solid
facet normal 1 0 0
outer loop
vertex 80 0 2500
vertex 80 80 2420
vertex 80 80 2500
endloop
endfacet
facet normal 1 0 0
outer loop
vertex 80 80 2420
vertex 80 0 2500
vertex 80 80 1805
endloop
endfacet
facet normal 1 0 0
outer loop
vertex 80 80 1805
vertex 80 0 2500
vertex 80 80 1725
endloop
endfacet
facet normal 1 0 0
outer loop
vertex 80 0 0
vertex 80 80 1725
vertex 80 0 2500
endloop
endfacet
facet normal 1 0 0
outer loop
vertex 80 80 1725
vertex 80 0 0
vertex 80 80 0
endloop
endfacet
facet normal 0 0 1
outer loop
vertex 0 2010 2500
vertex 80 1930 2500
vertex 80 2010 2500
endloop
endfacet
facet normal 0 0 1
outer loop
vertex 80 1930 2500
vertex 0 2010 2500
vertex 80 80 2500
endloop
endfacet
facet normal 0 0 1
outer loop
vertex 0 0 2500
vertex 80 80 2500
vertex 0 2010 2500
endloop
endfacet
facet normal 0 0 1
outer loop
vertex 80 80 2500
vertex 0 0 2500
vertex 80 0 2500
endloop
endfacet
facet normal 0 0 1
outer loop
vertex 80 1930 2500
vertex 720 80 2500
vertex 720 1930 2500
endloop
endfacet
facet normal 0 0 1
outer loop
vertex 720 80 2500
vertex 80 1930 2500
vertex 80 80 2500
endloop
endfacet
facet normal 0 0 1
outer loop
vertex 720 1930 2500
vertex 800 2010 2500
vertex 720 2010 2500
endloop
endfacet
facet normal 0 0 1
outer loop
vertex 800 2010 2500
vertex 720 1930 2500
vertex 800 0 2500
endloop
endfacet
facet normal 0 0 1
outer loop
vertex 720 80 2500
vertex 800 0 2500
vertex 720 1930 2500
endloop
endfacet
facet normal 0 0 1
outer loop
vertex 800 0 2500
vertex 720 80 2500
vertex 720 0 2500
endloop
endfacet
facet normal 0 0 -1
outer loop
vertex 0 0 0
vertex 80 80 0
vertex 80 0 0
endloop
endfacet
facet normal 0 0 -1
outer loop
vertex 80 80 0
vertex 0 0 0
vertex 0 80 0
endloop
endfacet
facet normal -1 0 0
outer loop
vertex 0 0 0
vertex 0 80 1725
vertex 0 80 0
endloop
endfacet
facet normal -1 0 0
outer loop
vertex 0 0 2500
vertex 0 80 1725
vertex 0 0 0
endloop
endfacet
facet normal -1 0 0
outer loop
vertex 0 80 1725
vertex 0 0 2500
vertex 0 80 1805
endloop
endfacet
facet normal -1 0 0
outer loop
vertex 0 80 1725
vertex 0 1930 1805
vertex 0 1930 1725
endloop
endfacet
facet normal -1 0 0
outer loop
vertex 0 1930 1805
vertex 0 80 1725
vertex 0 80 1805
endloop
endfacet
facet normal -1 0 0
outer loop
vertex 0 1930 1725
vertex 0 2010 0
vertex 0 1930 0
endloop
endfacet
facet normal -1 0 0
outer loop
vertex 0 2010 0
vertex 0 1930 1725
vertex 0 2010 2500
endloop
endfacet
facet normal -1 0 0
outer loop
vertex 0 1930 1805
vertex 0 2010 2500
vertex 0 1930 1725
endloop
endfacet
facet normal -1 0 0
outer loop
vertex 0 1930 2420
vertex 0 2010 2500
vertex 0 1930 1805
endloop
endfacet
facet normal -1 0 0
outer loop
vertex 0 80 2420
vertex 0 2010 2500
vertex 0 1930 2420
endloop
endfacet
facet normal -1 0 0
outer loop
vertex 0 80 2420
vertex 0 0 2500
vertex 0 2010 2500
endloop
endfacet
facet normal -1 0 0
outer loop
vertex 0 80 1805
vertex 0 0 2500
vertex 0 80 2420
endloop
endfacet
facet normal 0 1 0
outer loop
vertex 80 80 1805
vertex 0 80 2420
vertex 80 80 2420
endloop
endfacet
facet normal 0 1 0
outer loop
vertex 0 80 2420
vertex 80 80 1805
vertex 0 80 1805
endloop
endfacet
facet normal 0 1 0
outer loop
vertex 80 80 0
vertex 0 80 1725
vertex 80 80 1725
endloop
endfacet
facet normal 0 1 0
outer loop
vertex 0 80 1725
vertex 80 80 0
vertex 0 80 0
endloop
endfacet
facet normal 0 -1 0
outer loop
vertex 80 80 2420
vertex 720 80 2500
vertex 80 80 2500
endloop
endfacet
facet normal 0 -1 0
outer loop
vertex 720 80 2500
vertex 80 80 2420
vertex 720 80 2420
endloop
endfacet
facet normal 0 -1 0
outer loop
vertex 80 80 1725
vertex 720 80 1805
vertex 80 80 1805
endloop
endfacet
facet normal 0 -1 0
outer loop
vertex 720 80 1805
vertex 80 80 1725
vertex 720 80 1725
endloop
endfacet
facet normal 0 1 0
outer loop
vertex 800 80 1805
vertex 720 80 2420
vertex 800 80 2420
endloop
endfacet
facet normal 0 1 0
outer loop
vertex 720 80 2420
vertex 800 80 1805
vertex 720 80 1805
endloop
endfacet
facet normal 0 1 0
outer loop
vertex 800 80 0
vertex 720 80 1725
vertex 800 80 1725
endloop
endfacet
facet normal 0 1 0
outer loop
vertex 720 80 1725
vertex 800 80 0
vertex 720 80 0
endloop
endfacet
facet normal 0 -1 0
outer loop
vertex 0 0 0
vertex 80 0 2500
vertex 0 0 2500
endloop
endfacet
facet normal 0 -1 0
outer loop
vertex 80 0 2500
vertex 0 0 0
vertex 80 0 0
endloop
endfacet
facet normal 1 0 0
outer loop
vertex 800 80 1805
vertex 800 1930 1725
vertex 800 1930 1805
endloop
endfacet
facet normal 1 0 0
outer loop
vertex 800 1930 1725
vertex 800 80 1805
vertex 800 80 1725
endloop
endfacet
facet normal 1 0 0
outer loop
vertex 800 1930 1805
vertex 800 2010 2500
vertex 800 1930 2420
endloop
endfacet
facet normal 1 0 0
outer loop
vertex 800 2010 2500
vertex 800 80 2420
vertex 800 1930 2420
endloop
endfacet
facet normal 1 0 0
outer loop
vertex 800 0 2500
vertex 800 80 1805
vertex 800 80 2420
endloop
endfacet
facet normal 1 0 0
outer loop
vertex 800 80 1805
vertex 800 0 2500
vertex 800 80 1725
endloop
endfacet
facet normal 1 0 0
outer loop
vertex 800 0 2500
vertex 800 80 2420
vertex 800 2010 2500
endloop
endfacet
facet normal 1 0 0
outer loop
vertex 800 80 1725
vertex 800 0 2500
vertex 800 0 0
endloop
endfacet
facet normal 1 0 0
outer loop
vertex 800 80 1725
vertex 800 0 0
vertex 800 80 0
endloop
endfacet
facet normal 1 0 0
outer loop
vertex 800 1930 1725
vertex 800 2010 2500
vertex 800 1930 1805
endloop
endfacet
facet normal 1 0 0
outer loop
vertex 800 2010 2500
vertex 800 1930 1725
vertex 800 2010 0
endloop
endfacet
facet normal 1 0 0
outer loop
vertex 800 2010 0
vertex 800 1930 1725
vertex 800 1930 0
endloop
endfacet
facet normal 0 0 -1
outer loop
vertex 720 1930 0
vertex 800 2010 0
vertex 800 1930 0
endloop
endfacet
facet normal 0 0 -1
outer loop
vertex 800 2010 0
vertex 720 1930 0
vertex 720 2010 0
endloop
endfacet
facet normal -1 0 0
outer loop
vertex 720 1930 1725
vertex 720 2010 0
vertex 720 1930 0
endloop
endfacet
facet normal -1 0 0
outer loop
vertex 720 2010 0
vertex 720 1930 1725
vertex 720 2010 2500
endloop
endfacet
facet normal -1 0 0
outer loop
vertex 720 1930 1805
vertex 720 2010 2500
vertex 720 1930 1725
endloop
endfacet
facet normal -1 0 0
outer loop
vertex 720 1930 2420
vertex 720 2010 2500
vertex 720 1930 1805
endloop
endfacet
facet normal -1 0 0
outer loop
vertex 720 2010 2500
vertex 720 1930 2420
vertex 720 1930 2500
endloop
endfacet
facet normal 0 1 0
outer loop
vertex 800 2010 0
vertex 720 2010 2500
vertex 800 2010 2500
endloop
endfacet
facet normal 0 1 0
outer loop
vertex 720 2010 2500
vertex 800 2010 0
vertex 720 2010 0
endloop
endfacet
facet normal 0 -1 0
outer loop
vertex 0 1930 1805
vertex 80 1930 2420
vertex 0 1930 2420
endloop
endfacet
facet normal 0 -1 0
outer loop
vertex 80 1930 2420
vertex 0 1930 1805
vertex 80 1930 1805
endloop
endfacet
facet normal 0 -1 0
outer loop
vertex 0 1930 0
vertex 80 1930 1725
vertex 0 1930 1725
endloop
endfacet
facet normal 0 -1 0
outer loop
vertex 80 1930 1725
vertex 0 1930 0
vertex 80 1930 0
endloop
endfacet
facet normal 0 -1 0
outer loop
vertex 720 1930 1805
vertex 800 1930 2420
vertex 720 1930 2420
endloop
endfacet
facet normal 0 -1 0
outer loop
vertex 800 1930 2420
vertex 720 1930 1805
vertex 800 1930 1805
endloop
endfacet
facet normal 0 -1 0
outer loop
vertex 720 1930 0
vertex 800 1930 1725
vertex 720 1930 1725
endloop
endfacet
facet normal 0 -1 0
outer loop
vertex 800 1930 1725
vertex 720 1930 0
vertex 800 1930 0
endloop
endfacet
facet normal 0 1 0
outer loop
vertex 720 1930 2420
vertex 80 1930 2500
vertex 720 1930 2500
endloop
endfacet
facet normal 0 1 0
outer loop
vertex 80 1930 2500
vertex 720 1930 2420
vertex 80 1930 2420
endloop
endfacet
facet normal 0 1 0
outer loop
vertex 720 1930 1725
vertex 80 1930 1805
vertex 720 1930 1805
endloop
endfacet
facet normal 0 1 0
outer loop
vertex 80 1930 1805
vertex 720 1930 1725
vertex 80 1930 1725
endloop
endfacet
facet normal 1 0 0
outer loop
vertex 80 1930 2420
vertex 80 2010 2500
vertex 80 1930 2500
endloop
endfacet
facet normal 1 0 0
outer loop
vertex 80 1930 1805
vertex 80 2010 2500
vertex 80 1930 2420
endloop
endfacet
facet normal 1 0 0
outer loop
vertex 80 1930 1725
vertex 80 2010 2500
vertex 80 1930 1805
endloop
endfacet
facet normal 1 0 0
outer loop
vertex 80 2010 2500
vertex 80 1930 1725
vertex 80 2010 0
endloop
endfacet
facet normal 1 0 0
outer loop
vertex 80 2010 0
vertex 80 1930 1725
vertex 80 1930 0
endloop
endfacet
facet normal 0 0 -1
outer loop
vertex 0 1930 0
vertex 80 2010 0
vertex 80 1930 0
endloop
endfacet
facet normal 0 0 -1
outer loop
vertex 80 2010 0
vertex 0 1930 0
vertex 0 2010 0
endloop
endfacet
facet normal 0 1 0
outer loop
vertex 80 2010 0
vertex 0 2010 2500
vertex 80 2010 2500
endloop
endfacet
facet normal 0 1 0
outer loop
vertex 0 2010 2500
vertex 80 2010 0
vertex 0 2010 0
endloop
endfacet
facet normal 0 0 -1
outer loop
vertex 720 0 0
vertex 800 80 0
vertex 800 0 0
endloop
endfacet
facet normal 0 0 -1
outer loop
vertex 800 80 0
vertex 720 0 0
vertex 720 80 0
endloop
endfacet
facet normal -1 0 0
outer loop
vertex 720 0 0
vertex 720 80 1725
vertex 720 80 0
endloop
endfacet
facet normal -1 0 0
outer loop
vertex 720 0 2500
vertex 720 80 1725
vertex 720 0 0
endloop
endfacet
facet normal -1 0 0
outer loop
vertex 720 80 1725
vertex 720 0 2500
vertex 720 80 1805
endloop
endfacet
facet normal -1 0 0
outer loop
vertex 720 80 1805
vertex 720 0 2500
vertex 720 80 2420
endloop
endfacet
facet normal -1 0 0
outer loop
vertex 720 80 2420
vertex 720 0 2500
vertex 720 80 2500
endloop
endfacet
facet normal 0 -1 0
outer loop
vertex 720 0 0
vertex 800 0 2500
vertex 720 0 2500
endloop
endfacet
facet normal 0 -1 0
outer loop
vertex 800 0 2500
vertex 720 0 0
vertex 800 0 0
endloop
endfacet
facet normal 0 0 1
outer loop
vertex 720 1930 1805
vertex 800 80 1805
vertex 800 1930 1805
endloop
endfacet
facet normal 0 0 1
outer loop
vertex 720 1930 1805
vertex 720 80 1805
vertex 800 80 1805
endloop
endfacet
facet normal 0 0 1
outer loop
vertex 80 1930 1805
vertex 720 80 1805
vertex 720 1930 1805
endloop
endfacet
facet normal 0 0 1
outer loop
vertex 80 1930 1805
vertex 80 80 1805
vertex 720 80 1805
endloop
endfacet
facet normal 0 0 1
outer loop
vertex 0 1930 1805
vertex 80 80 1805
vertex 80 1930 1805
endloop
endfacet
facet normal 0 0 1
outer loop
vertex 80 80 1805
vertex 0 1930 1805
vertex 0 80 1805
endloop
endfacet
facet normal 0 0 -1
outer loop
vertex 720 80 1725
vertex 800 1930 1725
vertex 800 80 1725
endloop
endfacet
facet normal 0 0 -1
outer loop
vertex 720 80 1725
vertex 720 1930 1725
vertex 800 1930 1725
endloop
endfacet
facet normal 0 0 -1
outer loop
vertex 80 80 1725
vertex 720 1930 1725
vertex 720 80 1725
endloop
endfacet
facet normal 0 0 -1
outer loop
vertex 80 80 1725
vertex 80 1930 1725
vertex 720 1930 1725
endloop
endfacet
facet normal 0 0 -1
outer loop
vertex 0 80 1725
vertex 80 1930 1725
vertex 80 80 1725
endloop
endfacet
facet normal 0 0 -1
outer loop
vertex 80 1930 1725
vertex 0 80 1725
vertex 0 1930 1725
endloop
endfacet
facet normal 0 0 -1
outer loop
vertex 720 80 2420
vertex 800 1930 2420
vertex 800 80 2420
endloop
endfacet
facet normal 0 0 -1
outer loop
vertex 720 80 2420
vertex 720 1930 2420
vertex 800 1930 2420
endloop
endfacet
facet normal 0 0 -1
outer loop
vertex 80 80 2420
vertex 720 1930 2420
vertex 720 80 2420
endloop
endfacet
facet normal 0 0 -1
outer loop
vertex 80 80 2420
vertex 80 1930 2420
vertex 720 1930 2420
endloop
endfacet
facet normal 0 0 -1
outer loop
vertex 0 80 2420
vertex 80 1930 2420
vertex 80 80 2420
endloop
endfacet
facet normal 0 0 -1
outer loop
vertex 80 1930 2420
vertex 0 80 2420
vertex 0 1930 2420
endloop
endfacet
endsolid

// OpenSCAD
module almamidi(rackw=800, rackl=2010, rackh=2500, shelves=4, shelfstarth=0) {
    // rackl is the *total* length, including pole thickness!
    polet=80; // seems to be always 80

    color("#00f") {
        translate([0, 0, 0])  cube([polet,polet,rackh]);
        translate([rackw-polet, rackl-polet, 0]) cube([polet,polet,rackh]);
        translate([0, rackl-polet, 0]) cube([polet,polet,rackh]);
        translate([rackw-polet, 0, 0]) cube([polet,polet,rackh]);
    }

    module shelf() {
        translate([0, polet, 0]) color("#ff5733") cube([polet, rackl-(2*polet), polet]);
        translate([rackw-polet, polet, 0]) color("#ff5733") cube([polet, rackl-(2*polet), polet]);
        translate([polet,polet,0]) cube([rackw-(2*polet), rackl-(2*polet), polet]);
    }

    availh=rackh-polet-shelfstarth;
    shelves = shelves-1;

    shelfspacing = (availh - (shelves * polet)) / shelves;
    //shelfspacing = rackh / shelves;

    echo(shelfspacing);

    for (layer = [0:1:shelves]) {
        translate([0,0,(shelfspacing*layer)+(layer*polet)+shelfstarth]) shelf();
    }
    
}

almamidi(shelves=2,shelfstarth=1725);
